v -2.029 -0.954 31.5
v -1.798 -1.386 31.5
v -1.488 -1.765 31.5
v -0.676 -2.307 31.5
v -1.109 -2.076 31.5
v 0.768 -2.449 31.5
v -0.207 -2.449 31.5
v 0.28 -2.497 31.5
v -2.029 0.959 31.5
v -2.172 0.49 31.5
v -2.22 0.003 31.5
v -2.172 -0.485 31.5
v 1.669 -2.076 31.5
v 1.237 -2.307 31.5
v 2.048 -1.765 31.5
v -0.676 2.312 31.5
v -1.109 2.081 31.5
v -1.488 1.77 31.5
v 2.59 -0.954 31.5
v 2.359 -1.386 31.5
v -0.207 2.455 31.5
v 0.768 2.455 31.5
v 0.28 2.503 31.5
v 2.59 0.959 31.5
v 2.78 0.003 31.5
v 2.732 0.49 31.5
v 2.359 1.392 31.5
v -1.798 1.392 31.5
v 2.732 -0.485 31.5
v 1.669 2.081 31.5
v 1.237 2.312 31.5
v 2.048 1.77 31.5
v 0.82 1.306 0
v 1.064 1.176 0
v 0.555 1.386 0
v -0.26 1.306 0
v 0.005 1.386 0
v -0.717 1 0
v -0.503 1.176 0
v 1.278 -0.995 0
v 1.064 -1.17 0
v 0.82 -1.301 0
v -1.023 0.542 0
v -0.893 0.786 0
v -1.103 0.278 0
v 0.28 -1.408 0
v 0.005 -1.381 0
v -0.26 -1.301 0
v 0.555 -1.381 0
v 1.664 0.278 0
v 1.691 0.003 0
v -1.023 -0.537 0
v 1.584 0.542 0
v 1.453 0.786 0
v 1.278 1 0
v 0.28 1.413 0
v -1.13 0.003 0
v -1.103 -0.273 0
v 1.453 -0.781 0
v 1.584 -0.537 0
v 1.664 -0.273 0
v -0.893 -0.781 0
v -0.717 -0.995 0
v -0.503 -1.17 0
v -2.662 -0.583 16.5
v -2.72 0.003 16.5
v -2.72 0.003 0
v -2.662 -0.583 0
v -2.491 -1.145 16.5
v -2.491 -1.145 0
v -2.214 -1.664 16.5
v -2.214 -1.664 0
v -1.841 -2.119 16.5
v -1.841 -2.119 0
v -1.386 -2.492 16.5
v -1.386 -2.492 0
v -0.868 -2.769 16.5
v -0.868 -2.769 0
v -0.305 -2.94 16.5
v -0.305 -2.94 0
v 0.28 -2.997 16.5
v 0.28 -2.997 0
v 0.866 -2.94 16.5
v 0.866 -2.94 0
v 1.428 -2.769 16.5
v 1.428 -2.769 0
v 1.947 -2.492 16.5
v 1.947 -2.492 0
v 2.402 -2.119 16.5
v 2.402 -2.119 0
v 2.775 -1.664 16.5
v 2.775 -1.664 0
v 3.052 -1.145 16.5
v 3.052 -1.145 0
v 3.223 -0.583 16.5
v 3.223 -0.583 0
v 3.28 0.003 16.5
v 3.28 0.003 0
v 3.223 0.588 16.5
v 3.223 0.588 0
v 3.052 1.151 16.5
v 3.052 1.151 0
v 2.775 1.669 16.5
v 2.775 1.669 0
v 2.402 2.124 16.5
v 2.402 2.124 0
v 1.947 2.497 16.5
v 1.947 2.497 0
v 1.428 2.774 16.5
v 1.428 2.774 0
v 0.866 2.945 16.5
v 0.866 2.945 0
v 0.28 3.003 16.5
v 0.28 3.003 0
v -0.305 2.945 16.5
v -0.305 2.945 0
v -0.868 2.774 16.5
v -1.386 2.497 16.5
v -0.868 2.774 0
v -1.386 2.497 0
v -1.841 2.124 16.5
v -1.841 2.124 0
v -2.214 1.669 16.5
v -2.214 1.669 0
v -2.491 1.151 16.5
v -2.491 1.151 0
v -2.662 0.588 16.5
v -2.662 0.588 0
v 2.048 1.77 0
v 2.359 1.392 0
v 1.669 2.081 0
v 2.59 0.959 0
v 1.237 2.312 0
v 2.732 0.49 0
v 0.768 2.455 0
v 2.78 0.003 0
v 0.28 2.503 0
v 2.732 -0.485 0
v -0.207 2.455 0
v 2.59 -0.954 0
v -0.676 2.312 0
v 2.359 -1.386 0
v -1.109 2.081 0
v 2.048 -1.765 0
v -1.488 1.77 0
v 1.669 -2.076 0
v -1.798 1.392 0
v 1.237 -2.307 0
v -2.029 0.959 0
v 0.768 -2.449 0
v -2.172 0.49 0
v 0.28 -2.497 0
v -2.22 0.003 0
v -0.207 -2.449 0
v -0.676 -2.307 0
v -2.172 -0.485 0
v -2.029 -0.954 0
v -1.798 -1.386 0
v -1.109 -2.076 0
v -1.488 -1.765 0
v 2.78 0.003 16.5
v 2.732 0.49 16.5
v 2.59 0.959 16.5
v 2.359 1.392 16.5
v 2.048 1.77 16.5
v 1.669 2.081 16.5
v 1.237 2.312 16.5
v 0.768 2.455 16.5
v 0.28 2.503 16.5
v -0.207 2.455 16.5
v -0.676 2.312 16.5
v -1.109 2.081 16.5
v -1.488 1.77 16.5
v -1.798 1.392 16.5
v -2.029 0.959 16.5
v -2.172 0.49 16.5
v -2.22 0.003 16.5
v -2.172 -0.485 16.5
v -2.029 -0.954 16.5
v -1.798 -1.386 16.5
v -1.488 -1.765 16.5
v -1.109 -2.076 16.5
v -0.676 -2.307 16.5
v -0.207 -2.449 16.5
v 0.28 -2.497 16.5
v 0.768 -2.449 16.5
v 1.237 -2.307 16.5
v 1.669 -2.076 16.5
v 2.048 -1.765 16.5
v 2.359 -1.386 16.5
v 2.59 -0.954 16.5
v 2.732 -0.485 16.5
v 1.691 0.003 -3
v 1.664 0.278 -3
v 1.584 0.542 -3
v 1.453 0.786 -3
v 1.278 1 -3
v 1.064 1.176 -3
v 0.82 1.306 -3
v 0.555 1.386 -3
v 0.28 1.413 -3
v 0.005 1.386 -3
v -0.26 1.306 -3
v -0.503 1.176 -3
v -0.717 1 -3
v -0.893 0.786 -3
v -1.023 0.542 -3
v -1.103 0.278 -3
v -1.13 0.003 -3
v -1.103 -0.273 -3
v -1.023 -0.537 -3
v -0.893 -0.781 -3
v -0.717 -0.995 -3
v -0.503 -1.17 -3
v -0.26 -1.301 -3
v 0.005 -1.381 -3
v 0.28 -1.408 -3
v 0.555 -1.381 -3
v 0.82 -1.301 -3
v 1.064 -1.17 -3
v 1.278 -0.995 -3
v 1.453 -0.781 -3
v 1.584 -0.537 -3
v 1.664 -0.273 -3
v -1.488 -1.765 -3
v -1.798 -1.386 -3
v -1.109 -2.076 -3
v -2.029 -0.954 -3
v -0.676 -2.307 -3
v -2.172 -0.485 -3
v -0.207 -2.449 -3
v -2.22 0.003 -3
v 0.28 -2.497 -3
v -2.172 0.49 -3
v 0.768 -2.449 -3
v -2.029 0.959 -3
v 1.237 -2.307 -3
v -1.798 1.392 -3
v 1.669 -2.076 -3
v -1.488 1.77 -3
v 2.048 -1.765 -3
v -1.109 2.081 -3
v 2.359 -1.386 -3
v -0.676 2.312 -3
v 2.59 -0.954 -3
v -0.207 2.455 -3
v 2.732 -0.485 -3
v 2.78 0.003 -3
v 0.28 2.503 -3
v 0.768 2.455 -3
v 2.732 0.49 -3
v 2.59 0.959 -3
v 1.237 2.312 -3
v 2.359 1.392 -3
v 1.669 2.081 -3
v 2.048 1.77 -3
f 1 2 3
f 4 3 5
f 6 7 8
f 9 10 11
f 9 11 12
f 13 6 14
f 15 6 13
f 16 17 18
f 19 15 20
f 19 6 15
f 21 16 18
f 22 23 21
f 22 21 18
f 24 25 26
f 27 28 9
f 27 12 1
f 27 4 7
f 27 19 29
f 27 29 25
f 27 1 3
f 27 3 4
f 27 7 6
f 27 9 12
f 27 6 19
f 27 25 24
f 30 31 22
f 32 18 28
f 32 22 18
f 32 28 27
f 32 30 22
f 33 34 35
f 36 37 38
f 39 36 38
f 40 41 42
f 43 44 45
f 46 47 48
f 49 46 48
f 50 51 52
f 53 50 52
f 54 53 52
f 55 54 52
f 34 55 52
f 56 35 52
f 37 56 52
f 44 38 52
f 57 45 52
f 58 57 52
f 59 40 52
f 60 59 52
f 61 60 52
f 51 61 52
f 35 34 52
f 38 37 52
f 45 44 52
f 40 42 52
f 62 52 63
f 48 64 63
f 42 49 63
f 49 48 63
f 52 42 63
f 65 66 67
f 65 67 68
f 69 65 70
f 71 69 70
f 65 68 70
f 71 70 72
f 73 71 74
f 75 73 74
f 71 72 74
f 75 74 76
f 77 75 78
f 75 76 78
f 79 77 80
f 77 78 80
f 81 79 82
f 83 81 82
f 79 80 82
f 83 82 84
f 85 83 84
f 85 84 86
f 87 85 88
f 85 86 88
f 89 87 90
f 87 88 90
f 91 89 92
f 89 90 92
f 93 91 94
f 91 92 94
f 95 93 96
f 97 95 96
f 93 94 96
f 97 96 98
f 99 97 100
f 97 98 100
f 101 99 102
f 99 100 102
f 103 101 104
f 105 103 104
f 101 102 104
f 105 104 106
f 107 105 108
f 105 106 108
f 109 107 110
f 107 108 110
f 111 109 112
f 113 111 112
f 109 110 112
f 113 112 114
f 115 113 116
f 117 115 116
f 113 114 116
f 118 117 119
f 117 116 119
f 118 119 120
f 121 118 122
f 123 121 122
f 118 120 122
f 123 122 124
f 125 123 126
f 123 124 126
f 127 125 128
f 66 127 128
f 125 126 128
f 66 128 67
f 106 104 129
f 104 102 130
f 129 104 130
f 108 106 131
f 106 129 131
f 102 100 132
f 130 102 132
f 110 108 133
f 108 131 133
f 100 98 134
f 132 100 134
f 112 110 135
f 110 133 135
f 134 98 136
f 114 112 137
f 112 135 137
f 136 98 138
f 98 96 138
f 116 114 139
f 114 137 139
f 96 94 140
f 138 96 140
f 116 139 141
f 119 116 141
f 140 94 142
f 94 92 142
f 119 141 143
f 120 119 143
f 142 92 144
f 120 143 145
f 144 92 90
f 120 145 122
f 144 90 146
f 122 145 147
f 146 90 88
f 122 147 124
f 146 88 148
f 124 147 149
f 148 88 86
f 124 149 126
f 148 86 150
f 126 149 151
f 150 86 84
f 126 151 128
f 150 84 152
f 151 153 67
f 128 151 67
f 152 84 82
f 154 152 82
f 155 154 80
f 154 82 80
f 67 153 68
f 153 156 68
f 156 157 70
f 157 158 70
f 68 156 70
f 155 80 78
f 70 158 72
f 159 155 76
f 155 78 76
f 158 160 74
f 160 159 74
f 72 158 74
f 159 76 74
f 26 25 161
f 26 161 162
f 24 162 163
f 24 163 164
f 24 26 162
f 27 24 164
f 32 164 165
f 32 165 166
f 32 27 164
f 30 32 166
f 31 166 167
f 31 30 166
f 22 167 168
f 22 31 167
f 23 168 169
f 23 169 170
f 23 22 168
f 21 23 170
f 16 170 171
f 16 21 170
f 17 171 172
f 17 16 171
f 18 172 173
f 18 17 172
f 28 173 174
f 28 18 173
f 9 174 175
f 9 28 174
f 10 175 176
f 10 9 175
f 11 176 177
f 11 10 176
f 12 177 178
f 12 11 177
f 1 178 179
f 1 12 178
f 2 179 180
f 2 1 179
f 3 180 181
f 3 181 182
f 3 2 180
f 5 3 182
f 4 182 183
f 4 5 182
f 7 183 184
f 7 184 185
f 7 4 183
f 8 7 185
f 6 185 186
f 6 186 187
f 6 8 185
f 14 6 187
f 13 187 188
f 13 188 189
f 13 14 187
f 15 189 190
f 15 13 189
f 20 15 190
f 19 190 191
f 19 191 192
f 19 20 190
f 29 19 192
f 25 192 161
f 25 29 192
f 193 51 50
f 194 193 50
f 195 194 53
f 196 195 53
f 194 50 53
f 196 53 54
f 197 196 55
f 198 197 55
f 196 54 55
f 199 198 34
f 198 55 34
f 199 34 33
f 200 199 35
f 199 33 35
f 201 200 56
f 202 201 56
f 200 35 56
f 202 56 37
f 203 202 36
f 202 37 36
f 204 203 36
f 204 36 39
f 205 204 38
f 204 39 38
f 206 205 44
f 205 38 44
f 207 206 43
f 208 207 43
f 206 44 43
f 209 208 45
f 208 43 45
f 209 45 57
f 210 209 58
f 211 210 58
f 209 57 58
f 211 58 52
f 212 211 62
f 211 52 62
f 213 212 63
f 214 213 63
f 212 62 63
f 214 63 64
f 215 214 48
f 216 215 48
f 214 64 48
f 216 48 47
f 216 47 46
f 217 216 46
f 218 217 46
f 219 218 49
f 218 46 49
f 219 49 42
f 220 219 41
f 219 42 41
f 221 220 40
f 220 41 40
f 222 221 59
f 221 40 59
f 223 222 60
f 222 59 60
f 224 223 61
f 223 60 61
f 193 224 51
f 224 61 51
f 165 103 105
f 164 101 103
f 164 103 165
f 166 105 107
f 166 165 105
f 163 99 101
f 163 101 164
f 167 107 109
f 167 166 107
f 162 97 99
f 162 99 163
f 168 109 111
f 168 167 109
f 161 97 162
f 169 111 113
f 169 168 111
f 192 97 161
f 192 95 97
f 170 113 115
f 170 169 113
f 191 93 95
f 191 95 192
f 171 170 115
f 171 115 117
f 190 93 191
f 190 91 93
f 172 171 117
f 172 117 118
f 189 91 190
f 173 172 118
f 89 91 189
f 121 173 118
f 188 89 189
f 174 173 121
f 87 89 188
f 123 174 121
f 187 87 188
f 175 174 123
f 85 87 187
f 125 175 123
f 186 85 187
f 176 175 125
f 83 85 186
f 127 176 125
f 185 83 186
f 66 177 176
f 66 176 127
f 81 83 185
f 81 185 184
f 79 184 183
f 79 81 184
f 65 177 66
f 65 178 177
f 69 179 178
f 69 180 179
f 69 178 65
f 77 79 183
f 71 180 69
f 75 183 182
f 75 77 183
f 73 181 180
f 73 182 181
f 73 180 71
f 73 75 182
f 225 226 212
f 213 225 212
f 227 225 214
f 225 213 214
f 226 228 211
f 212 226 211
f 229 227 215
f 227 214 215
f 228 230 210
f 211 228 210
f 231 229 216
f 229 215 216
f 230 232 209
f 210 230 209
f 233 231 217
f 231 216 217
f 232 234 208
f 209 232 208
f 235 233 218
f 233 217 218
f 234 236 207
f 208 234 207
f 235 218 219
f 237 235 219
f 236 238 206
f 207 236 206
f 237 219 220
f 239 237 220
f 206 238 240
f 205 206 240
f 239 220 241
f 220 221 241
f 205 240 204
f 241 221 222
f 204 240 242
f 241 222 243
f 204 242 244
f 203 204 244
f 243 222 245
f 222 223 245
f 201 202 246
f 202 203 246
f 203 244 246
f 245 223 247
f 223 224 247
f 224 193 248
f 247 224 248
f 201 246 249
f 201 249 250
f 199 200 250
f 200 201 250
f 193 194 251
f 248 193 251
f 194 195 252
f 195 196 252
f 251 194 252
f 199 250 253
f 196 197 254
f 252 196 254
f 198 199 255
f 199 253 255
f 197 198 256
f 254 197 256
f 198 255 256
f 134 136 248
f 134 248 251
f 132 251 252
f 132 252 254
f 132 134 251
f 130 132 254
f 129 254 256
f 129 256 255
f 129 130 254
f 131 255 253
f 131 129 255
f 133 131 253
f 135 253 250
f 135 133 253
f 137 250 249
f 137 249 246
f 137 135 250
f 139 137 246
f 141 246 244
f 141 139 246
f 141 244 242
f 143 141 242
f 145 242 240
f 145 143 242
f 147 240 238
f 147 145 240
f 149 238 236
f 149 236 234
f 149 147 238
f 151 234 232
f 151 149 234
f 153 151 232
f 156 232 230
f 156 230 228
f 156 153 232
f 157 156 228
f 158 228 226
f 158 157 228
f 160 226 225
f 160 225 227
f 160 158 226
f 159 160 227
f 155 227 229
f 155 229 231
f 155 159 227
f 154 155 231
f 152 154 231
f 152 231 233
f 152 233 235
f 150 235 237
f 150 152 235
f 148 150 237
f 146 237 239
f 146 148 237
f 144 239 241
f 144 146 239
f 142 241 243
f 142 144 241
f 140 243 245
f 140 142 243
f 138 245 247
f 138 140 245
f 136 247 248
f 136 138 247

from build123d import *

# Parameters (mm, degrees)
SKETCH_1_R      = 2.5
SKETCH_1_R_2    = 1.410646597
EXTRUDE_1_DEPTH = 3
SKETCH_2_R      = 3
EXTRUDE_2_DEPTH = 16.5
EXTRUDE_START   = 15
SKETCH_3_R      = 2.5
EXTRUDE_3_DEPTH = 15


with BuildPart() as part:
    # Эскиз1 → Бобышка-Вытянуть1 (new body)
    with BuildSketch(Plane.XY):
        with Locations((0.280254447, 0.00265159)):
            Circle(SKETCH_1_R)
        with Locations((0.280254447, 0.00265159)):
            Circle(SKETCH_1_R_2, mode=Mode.SUBTRACT)
    extrude(amount=-EXTRUDE_1_DEPTH)

    # Эскиз2 → Бобышка-Вытянуть2 (add)
    with BuildSketch(Plane.XY):
        with Locations(Location((0.280254447, 0.00265159, 0), (0, 0, 180))):
            Circle(SKETCH_2_R)
    extrude(amount=EXTRUDE_2_DEPTH)

    # Эскиз3 → Бобышка-Вытянуть3 (add)
    with BuildSketch(Plane.XY.offset(16.5).offset(EXTRUDE_START)):
        with Locations((0.280254447, 0.00265159)):
            Circle(SKETCH_3_R)
    extrude(amount=-EXTRUDE_3_DEPTH)


solid = part.part
